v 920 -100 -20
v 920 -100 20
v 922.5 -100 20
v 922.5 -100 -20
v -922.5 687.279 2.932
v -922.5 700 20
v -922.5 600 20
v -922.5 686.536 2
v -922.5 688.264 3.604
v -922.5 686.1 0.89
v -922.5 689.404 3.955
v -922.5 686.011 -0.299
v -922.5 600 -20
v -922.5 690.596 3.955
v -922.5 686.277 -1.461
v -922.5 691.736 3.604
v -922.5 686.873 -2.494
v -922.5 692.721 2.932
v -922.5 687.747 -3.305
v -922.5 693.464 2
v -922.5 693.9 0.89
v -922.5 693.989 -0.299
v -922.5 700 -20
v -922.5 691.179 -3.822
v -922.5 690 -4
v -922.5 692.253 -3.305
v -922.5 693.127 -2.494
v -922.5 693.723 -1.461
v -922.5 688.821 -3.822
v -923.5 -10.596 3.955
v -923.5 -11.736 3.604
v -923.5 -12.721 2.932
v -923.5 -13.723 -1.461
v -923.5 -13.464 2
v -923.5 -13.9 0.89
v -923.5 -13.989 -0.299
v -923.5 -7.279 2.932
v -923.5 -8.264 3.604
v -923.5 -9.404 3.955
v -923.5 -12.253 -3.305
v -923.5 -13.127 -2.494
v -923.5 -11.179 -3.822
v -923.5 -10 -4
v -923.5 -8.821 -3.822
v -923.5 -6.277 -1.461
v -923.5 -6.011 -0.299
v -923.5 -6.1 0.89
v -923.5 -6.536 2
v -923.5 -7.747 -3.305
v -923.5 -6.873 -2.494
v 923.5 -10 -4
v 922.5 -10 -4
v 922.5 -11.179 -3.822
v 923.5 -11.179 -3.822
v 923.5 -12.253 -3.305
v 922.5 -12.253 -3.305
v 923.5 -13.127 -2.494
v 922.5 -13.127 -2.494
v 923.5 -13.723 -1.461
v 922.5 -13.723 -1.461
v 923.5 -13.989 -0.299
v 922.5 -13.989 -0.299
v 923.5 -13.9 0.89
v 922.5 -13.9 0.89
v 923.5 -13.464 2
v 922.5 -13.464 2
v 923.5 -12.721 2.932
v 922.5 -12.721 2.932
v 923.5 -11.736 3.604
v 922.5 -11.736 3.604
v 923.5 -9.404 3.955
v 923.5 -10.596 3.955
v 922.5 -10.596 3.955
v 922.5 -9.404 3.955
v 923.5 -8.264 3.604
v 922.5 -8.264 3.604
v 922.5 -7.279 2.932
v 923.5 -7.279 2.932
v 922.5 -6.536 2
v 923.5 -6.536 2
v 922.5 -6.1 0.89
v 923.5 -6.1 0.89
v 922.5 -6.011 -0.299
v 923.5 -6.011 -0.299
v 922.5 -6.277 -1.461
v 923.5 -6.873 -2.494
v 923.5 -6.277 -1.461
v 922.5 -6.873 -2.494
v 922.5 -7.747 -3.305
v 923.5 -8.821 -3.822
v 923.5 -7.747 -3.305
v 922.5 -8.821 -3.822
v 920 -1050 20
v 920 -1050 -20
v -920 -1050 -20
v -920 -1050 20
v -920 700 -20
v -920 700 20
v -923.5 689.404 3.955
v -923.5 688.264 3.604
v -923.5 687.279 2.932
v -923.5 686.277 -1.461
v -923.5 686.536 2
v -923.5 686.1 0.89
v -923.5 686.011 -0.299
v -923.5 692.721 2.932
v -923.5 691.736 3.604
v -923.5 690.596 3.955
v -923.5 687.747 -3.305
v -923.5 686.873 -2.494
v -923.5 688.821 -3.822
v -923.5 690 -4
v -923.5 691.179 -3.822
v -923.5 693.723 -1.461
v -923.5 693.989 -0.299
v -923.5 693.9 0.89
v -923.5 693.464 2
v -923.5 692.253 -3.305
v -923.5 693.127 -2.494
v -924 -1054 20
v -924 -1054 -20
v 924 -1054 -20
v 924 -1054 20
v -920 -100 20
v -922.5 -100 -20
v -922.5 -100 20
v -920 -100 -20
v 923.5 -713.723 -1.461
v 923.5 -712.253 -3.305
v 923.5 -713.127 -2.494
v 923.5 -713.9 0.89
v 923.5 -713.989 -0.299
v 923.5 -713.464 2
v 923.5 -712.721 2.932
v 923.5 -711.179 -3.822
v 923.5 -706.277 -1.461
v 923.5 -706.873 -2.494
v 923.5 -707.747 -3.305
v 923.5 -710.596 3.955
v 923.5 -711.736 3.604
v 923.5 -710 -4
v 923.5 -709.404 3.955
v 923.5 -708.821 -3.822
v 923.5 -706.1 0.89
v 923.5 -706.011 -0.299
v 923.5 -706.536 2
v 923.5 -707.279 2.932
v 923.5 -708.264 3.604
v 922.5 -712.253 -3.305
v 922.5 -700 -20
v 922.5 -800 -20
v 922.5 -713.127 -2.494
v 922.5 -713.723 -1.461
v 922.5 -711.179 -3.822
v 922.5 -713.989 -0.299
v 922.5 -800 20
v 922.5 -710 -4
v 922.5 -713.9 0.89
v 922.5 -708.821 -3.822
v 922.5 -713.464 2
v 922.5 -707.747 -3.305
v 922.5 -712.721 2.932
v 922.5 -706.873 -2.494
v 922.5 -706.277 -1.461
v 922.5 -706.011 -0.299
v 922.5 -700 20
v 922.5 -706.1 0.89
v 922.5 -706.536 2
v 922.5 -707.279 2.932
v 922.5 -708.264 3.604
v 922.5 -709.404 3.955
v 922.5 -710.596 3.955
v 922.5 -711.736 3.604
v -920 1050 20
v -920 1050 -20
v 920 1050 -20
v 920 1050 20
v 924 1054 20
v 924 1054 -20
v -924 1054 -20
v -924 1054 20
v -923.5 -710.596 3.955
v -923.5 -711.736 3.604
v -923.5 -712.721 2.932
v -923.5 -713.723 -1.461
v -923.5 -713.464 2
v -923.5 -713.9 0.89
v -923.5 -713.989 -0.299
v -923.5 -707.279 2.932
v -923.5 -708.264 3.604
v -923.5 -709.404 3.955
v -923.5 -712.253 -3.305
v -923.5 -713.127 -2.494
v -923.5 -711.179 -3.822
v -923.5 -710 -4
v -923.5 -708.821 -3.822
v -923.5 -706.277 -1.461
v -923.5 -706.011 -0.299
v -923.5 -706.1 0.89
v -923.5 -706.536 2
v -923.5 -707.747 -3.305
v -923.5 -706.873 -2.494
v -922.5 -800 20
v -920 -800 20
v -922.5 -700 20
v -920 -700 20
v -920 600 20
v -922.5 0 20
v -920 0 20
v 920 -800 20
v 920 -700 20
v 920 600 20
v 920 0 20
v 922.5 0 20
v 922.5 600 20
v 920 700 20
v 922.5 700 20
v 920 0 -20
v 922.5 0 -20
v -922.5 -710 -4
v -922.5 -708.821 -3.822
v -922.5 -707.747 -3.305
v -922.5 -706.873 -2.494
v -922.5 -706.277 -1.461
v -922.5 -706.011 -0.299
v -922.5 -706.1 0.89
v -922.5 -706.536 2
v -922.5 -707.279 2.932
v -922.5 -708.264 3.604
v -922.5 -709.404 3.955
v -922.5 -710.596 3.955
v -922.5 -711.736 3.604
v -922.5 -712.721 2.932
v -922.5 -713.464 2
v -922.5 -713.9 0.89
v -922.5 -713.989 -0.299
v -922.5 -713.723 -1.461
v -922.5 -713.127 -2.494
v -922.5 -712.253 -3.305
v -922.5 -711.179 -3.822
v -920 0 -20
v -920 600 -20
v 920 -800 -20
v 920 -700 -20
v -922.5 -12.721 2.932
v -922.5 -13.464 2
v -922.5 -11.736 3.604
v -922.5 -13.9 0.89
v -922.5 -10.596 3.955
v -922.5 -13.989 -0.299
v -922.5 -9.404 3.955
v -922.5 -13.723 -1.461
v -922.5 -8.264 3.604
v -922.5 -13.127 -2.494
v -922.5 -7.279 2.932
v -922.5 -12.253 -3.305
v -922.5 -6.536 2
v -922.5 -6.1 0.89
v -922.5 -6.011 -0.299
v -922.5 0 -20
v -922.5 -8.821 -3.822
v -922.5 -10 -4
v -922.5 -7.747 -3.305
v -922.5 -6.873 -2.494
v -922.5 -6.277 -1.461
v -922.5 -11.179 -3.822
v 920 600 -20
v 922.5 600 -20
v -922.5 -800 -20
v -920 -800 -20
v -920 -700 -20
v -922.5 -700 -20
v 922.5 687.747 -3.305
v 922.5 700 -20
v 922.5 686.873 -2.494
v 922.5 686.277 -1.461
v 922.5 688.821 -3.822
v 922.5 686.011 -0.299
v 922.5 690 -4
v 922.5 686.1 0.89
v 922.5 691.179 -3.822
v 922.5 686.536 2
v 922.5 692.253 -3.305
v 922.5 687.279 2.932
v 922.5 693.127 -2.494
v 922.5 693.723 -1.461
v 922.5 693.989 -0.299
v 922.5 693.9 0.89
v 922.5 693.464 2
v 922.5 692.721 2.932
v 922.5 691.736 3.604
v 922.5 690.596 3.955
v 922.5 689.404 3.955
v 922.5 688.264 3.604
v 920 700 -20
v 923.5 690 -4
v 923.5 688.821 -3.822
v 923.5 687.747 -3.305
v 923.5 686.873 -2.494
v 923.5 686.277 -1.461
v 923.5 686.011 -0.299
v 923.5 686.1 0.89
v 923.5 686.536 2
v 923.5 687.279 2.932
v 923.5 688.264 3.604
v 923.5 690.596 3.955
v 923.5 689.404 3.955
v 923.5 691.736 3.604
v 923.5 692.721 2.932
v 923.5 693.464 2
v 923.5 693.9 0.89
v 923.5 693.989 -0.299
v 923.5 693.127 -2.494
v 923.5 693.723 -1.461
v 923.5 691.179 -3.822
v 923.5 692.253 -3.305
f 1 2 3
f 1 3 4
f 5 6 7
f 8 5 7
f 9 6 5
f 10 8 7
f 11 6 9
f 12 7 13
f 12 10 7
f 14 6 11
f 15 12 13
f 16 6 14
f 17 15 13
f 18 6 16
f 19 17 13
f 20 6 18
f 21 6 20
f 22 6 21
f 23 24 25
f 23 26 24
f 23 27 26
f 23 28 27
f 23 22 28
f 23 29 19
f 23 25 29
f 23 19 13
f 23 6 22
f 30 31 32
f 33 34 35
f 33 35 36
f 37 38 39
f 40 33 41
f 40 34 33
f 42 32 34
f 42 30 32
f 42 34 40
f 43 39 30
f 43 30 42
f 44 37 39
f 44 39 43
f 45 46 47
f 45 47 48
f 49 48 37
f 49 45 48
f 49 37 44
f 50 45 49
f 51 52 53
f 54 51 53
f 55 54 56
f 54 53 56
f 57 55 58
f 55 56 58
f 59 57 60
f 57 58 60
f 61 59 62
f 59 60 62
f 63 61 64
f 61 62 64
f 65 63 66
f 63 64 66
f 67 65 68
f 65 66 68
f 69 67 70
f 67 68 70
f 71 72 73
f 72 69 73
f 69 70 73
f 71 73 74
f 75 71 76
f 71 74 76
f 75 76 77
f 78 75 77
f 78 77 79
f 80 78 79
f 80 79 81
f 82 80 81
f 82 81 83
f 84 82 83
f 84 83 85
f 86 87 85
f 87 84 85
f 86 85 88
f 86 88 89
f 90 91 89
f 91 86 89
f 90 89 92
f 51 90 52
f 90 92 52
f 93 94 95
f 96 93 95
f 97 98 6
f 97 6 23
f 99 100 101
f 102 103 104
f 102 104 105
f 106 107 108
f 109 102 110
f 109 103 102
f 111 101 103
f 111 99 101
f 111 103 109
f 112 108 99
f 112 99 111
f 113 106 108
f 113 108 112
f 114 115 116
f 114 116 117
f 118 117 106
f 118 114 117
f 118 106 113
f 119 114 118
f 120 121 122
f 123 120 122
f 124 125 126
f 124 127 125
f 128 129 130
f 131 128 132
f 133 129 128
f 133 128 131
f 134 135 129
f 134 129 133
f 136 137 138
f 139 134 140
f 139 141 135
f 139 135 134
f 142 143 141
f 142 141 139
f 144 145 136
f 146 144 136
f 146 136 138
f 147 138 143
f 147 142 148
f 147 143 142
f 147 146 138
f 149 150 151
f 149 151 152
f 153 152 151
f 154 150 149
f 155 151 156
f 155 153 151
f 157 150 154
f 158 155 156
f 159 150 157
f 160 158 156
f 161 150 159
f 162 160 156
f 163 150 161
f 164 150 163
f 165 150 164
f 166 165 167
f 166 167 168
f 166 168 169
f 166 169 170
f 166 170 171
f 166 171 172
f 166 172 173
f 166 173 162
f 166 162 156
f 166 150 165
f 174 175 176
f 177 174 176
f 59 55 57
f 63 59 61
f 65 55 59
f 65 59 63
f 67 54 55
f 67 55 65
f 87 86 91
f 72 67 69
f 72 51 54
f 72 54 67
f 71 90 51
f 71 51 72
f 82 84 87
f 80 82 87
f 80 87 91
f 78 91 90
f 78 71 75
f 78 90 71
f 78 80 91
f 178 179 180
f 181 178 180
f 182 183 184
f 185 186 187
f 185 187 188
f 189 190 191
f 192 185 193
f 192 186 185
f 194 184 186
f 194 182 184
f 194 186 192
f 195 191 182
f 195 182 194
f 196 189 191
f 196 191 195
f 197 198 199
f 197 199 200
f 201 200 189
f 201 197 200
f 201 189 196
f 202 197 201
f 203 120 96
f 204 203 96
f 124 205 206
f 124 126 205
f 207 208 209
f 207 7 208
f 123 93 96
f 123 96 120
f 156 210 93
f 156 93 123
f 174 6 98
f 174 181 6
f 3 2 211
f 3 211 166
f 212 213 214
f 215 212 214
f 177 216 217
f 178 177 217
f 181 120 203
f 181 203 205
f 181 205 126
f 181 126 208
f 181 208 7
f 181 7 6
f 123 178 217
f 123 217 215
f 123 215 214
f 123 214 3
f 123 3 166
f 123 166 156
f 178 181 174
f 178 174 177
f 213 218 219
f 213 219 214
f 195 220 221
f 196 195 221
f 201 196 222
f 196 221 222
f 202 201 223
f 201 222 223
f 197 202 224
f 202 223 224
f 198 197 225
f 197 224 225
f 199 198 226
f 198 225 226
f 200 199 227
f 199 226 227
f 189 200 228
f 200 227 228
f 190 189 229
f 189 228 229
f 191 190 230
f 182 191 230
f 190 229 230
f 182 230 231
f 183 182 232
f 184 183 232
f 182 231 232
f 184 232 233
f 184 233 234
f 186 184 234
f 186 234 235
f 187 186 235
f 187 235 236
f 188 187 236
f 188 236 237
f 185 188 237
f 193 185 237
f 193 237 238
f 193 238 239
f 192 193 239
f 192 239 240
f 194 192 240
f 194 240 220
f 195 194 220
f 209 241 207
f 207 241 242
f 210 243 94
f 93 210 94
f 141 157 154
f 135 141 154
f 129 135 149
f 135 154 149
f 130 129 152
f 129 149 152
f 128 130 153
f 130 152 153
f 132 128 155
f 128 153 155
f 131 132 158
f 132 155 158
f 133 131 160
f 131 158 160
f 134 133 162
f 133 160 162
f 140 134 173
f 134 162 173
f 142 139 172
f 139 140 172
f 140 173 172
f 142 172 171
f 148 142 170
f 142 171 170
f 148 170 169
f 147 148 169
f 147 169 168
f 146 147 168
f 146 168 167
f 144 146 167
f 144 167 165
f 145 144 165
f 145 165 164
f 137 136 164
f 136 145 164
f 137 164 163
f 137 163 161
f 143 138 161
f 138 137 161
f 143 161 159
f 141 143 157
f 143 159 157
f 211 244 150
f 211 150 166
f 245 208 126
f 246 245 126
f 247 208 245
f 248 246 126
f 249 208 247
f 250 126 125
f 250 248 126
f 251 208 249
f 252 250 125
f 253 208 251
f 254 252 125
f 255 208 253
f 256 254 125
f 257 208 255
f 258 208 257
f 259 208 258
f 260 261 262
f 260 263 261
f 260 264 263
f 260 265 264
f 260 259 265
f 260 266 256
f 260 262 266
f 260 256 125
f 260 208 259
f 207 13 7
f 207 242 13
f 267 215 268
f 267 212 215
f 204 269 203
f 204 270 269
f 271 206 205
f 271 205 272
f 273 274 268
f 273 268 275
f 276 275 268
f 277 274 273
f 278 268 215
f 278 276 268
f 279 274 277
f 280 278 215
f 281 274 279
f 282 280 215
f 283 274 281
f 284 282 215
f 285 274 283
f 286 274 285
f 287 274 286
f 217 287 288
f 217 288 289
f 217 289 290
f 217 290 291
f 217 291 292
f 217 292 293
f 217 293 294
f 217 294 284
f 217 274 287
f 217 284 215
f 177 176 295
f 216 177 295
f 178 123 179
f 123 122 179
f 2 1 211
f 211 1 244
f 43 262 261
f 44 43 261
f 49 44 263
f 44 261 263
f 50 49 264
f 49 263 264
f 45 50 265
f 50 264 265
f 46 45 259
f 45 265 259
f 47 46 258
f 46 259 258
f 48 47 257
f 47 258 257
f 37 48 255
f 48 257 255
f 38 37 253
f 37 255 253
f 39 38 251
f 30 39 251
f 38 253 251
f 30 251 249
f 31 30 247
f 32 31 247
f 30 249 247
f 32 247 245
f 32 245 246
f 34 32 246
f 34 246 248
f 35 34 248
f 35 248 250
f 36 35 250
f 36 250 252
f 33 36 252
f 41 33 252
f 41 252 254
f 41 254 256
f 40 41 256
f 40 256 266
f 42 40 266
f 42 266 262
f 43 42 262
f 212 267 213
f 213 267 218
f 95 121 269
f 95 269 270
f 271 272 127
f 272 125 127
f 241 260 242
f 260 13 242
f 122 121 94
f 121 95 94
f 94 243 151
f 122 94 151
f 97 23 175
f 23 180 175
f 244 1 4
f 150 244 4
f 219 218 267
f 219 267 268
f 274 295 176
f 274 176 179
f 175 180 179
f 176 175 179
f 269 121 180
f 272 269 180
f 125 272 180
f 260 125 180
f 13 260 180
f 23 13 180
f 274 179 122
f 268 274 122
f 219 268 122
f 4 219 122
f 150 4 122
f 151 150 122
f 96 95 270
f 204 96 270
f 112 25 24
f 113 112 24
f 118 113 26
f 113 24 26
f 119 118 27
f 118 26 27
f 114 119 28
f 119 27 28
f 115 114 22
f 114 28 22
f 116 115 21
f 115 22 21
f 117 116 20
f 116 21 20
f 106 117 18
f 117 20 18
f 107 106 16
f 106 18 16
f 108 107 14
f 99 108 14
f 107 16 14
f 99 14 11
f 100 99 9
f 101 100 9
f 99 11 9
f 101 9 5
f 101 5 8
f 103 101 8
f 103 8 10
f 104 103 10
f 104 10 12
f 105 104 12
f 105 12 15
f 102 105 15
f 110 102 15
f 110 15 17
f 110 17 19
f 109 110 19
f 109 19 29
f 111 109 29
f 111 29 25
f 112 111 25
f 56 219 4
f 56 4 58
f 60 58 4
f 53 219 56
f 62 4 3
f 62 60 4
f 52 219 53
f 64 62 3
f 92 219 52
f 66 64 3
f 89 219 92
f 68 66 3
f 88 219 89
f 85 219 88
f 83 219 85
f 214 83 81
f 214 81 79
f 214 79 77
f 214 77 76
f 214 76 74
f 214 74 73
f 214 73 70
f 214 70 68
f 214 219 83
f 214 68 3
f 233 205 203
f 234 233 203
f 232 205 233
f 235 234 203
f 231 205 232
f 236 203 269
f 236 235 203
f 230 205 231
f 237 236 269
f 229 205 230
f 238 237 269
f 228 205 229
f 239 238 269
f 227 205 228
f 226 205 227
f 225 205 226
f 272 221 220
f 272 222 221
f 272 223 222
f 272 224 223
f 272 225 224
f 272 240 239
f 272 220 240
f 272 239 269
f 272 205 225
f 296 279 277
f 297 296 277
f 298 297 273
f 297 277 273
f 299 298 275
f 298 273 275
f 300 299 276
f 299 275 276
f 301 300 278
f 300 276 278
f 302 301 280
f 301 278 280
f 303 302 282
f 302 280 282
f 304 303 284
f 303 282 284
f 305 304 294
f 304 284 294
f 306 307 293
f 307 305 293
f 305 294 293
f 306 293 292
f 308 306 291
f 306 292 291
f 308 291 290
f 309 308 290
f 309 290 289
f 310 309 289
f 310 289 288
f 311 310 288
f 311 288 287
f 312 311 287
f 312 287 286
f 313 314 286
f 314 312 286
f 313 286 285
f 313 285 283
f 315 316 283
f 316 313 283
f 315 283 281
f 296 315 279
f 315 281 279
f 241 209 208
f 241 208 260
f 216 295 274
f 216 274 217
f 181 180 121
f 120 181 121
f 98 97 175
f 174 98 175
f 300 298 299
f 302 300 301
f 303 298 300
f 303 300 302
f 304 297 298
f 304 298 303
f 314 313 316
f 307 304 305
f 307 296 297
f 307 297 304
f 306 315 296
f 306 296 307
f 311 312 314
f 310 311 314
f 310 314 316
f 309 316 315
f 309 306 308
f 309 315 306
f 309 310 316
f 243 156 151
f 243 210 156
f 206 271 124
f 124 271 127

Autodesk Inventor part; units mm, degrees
ref_plane "YZ Plane" through (0, 0, 0) normal (1, 0, 0) x (0, 1, 0)
ref_plane "XZ Plane" through (0, 0, 0) normal (0, 1, 0) x (-1, 0, 0)
ref_plane "XY Plane" through (0, 0, 0) normal (0, 0, 1) x (1, 0, 0)
sketch "Sketch1" plane through (0, 0, 0) normal (0, 0, 1) x (1, 0, 0)
  line L0 (920, -1050) -> (-920, -1050)
  line L1 (-920, -1050) -> (-920, 1050)
  line L2 (-920, 1050) -> (920, 1050)
  line L3 (920, 1050) -> (920, -1050)
  line L4 (920, -1050) -> (-920, 1050) construction
  line L5 (-920, -1050) -> (920, 1050) construction
  line L6 (924, 1054) -> (-924, 1054)
  line L7 (-924, 1054) -> (-924, -1054)
  line L8 (-924, -1054) -> (924, -1054)
  line L9 (924, -1054) -> (924, 1054)
  point P0 (0, 0)
  dimension "d0" = 1840
  dimension "d1" = 2100
  dimension "d2" = 4
extrude "Extrusion1" add sketch "Sketch1" along normal mid plane 40
sketch "Sketch2" plane through (-920, -1050, 20) normal (1, 0, 0) x (0, 0, -1)
  line L0 (0, 2104) -> (0, -4) projected
  line L1 (40, -4) -> (40, 2104) projected
  line L2 (0, 1750) -> (40, 1750)
  line L3 (40, 1750) -> (40, 1650)
  line L4 (40, 1650) -> (0, 1650)
  line L5 (0, 1650) -> (0, 1750)
  line L6 (0, 2104) -> (40, 2104) projected
  line L7 (0, 1050) -> (40, 1050)
  line L8 (40, 1050) -> (40, 950)
  line L9 (0, 950) -> (0, 1050)
  line L10 (40, 950) -> (0, 950)
  line L11 (0, 350) -> (40, 350)
  line L12 (40, 350) -> (40, 250)
  line L13 (0, 250) -> (0, 350)
  line L14 (40, 250) -> (0, 250)
  line L15 (40, 2100) -> (0, 2100) projected
  point P0 (20, 1050)
  point P1 (0, 250)
  point P2 (40, 350)
  point P3 (0, 950)
  point P4 (40, 1050)
  point P5 (0, 1650)
  point P6 (40, 1750)
  dimension "d5" = 100
  dimension "d9" = 700
  dimension "d24" = 350
extrude "Extrusion2" cut sketch "Sketch2" against normal blind 2.5 contours L2 L1 L4 L0 | L7 L1 L10 L0 | L11 L1 L14 L0
mirror "Mirror1" about plane through (0, 0, 0) normal (1, 0, 0) of "Extrusion2"
sketch "Sketch3" plane through (-922.5, -1050, 20) normal (1, 0, 0) x (0, 0, -1)
  circle A0 centre (20, 340) radius 4
  line L0 (0, 2104) -> (0, -4) projected
  line L1 (0, 350) -> (40, 350) projected
  point P0 (20, 1050)
  dimension "d16" = 8
  dimension "d17" = 20
  dimension "d18" = 10
extrude "Extrusion3" cut sketch "Sketch3" against normal blind 1
pattern_linear "Rectangular Pattern1" count 3 spacing 700 along (0, 1, 0) of "Extrusion3"
mirror "Mirror2" about plane through (0, 0, 0) normal (1, 0, 0) of "Extrusion3", "Rectangular Pattern1"
properties part number "Frame2" material "Zinc"
